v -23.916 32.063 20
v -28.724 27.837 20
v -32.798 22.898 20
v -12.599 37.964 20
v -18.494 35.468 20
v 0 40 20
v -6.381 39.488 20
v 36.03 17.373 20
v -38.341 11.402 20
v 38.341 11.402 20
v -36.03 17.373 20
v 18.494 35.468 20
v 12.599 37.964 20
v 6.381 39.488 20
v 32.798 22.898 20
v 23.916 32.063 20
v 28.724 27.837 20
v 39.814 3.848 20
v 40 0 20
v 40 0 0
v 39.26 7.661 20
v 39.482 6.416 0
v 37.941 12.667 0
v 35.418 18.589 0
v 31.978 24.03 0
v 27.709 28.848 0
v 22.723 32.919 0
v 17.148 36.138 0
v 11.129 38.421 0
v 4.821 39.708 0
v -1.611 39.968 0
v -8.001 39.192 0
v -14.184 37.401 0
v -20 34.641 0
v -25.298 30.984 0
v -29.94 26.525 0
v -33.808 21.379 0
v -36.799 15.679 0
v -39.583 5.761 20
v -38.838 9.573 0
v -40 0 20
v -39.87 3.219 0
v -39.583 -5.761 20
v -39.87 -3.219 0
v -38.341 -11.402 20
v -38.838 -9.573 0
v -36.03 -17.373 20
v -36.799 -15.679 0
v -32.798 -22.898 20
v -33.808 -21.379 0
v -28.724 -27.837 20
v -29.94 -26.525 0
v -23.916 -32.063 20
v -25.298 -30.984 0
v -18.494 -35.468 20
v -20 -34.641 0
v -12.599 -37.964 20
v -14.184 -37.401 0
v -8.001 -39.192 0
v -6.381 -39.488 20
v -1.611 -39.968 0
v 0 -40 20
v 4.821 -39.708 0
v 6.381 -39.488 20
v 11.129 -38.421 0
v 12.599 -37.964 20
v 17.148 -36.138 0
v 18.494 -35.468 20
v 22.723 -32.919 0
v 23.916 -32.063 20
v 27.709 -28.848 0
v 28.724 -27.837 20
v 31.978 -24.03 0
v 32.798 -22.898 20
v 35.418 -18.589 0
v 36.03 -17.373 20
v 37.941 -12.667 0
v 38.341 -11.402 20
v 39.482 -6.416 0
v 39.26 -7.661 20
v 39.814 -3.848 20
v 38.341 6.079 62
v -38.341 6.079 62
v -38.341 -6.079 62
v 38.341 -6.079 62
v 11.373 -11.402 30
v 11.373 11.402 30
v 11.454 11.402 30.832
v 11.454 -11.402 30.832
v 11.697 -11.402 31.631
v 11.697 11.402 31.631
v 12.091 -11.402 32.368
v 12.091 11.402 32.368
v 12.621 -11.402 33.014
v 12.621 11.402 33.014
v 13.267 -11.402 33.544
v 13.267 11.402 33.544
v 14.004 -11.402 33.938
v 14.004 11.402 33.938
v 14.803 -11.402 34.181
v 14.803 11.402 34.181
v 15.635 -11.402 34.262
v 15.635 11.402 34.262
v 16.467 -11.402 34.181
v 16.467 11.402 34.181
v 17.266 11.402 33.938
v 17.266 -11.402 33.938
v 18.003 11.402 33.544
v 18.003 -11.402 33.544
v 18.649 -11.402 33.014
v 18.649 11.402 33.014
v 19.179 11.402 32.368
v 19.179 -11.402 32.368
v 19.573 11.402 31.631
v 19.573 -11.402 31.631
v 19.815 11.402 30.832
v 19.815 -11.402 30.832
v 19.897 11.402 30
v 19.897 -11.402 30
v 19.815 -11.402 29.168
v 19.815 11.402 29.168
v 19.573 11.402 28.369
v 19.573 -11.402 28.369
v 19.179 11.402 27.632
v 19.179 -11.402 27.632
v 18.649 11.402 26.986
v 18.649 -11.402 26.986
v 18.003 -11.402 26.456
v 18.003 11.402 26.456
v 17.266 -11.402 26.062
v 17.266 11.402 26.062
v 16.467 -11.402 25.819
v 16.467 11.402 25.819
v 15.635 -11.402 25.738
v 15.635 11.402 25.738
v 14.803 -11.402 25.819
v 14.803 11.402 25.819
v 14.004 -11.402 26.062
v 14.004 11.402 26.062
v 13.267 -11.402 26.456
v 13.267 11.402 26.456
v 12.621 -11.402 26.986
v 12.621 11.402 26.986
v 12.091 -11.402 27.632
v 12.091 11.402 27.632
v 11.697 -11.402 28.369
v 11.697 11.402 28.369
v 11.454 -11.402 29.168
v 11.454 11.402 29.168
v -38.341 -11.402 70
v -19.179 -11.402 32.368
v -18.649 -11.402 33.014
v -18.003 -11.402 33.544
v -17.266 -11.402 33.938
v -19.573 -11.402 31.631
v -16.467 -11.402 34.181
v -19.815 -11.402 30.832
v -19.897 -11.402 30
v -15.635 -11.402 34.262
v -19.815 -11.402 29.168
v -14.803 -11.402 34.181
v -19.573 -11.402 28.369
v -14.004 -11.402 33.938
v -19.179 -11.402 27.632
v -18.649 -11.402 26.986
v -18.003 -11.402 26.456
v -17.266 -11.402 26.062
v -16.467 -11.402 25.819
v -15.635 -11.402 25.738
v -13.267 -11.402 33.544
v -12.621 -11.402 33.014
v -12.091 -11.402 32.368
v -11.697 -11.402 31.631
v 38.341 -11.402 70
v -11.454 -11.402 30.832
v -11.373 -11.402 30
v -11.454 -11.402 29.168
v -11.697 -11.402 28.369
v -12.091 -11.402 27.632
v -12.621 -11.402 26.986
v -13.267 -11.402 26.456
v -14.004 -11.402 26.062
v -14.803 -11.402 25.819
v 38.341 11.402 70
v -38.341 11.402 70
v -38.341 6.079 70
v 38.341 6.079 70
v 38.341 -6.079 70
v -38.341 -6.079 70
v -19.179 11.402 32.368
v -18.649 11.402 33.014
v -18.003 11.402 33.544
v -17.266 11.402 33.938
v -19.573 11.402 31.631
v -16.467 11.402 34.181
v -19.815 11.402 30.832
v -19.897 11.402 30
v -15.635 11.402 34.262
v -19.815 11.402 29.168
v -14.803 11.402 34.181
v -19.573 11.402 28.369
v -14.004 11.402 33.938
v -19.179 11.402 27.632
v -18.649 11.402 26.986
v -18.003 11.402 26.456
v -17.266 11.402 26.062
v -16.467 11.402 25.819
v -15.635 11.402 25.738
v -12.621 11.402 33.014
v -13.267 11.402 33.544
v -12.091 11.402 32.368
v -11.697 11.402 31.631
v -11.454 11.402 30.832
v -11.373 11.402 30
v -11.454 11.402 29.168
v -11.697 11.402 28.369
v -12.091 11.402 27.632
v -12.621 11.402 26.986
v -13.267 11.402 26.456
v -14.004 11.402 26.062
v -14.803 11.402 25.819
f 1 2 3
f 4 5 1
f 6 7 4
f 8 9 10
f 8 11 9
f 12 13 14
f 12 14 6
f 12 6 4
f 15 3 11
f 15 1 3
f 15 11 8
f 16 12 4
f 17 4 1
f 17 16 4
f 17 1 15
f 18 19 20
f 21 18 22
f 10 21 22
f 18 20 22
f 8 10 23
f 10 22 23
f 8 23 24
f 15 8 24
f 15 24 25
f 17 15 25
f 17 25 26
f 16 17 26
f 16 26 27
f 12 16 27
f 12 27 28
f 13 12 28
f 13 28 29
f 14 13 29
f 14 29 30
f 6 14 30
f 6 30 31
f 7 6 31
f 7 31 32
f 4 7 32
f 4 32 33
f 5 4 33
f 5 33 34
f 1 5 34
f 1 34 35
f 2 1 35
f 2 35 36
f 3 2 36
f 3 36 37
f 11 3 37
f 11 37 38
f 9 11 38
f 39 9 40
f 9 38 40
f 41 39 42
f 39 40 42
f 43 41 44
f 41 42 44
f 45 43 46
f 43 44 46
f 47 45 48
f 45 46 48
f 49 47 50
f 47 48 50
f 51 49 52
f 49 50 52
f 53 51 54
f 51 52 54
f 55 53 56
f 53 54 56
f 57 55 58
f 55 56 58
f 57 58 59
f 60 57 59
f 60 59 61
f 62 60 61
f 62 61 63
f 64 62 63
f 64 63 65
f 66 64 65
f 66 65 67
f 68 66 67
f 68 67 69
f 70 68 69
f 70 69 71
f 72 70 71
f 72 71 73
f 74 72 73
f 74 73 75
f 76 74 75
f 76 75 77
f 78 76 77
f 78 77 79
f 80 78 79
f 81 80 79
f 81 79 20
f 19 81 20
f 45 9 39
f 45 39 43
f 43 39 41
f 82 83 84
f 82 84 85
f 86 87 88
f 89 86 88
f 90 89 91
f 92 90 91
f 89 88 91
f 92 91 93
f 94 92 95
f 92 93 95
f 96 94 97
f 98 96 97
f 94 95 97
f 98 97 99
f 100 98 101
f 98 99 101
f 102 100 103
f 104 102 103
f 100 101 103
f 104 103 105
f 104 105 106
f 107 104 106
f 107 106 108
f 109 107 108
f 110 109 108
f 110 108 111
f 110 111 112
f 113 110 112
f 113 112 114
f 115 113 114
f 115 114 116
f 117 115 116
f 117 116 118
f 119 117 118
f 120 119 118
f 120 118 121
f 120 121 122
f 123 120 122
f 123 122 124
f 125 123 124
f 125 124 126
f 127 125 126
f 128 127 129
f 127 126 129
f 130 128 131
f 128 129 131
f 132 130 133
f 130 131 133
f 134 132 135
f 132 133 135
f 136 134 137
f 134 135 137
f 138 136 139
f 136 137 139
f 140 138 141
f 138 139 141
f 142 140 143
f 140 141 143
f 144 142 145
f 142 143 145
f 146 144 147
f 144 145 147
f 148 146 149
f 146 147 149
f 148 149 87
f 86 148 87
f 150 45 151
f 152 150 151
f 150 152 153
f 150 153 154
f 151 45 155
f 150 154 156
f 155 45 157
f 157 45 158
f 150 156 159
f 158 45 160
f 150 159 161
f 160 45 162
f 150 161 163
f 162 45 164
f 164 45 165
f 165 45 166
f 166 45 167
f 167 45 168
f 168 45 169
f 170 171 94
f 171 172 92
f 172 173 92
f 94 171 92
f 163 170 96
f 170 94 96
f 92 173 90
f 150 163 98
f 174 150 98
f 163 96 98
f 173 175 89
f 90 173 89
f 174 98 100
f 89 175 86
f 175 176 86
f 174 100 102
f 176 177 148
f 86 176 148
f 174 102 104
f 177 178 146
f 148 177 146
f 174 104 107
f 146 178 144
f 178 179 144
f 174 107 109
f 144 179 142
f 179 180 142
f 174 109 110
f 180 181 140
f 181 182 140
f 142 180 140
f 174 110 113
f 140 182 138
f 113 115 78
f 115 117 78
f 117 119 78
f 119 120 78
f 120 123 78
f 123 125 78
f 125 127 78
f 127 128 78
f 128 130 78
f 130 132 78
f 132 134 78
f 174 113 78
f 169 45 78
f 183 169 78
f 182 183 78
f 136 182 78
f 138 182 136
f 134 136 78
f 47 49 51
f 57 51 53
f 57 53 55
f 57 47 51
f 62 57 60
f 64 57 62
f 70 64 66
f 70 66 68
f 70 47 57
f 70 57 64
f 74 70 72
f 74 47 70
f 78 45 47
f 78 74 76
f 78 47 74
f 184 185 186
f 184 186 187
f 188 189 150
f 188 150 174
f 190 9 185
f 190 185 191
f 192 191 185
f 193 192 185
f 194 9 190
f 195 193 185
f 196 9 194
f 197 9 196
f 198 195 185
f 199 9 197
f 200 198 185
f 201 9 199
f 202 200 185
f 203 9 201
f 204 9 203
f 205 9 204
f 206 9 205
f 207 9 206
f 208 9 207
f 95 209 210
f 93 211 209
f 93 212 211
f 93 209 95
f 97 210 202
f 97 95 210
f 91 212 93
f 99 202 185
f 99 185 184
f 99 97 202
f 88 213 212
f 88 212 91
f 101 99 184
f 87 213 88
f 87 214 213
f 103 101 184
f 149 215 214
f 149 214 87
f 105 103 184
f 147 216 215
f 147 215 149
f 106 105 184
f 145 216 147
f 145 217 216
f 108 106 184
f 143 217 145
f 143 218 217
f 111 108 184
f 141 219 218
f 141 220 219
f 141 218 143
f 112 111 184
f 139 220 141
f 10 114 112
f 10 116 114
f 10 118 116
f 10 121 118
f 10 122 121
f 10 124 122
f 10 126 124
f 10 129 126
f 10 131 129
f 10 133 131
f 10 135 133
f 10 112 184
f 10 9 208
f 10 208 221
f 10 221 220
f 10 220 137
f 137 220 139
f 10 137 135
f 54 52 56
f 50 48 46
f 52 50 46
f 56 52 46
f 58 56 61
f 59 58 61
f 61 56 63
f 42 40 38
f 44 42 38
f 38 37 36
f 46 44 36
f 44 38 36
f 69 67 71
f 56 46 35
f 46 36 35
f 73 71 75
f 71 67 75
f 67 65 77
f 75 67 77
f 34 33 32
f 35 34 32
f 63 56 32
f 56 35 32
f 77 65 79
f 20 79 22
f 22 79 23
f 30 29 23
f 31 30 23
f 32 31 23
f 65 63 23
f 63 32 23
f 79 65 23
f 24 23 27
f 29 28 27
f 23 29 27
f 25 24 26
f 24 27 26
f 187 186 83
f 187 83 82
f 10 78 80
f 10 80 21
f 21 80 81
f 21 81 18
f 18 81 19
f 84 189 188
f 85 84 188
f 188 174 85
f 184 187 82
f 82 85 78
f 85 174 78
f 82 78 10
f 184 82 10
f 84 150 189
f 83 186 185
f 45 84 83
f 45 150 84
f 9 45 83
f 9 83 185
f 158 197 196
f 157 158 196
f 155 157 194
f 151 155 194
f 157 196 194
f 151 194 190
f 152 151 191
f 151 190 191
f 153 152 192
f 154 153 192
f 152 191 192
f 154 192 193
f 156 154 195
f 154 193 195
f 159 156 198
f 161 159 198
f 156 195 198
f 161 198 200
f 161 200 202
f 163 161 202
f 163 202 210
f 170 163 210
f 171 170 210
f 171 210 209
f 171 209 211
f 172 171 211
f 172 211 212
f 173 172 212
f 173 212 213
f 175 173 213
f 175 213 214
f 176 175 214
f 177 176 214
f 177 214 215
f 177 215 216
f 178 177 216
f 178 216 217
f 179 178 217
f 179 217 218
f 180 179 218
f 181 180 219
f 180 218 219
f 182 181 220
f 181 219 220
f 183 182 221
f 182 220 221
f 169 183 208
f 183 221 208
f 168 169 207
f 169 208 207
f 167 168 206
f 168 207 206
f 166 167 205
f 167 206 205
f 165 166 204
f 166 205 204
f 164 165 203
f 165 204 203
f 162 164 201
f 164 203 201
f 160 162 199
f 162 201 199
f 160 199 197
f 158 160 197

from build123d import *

# Parameters (mm, degrees)
F0_R     = 40
F1_DEPTH = 20
F2_W     = 76.681012
F2_H     = 22.804
F3_DEPTH = 50
F4_W     = 76.681012
F4_H     = 12.157896
F5_DEPTH = 8
F6_R     = 4.262414
F7_DEPTH = 51.403


with BuildPart() as f1:
    # F0 (on Top) → F1 (new body)
    with BuildSketch(Plane.XY):
        Circle(F0_R)
    extrude(amount=F1_DEPTH)

    # F2 (on face) → F3 (join)
    with BuildSketch(Plane.XY.offset(20)):
        Rectangle(F2_W, F2_H)
    extrude(amount=F3_DEPTH)

    # F4 (on face) → F5 (cut)
    with BuildSketch(Plane.XY.offset(70)):
        Rectangle(F4_W, F4_H)
    extrude(amount=-F5_DEPTH, mode=Mode.SUBTRACT)

    # F6 (on face) → F7 (cut, through all)
    with BuildSketch(Plane(origin=(0, 11.402, 0), x_dir=(-1, 0, 0), z_dir=(0, 1, 0))):
        with Locations((-15.634964, 30)):
            Circle(F6_R)
        with Locations((15.634964, 30)):
            Circle(F6_R)
    extrude(amount=-F7_DEPTH, mode=Mode.SUBTRACT)


solid = f1.part
